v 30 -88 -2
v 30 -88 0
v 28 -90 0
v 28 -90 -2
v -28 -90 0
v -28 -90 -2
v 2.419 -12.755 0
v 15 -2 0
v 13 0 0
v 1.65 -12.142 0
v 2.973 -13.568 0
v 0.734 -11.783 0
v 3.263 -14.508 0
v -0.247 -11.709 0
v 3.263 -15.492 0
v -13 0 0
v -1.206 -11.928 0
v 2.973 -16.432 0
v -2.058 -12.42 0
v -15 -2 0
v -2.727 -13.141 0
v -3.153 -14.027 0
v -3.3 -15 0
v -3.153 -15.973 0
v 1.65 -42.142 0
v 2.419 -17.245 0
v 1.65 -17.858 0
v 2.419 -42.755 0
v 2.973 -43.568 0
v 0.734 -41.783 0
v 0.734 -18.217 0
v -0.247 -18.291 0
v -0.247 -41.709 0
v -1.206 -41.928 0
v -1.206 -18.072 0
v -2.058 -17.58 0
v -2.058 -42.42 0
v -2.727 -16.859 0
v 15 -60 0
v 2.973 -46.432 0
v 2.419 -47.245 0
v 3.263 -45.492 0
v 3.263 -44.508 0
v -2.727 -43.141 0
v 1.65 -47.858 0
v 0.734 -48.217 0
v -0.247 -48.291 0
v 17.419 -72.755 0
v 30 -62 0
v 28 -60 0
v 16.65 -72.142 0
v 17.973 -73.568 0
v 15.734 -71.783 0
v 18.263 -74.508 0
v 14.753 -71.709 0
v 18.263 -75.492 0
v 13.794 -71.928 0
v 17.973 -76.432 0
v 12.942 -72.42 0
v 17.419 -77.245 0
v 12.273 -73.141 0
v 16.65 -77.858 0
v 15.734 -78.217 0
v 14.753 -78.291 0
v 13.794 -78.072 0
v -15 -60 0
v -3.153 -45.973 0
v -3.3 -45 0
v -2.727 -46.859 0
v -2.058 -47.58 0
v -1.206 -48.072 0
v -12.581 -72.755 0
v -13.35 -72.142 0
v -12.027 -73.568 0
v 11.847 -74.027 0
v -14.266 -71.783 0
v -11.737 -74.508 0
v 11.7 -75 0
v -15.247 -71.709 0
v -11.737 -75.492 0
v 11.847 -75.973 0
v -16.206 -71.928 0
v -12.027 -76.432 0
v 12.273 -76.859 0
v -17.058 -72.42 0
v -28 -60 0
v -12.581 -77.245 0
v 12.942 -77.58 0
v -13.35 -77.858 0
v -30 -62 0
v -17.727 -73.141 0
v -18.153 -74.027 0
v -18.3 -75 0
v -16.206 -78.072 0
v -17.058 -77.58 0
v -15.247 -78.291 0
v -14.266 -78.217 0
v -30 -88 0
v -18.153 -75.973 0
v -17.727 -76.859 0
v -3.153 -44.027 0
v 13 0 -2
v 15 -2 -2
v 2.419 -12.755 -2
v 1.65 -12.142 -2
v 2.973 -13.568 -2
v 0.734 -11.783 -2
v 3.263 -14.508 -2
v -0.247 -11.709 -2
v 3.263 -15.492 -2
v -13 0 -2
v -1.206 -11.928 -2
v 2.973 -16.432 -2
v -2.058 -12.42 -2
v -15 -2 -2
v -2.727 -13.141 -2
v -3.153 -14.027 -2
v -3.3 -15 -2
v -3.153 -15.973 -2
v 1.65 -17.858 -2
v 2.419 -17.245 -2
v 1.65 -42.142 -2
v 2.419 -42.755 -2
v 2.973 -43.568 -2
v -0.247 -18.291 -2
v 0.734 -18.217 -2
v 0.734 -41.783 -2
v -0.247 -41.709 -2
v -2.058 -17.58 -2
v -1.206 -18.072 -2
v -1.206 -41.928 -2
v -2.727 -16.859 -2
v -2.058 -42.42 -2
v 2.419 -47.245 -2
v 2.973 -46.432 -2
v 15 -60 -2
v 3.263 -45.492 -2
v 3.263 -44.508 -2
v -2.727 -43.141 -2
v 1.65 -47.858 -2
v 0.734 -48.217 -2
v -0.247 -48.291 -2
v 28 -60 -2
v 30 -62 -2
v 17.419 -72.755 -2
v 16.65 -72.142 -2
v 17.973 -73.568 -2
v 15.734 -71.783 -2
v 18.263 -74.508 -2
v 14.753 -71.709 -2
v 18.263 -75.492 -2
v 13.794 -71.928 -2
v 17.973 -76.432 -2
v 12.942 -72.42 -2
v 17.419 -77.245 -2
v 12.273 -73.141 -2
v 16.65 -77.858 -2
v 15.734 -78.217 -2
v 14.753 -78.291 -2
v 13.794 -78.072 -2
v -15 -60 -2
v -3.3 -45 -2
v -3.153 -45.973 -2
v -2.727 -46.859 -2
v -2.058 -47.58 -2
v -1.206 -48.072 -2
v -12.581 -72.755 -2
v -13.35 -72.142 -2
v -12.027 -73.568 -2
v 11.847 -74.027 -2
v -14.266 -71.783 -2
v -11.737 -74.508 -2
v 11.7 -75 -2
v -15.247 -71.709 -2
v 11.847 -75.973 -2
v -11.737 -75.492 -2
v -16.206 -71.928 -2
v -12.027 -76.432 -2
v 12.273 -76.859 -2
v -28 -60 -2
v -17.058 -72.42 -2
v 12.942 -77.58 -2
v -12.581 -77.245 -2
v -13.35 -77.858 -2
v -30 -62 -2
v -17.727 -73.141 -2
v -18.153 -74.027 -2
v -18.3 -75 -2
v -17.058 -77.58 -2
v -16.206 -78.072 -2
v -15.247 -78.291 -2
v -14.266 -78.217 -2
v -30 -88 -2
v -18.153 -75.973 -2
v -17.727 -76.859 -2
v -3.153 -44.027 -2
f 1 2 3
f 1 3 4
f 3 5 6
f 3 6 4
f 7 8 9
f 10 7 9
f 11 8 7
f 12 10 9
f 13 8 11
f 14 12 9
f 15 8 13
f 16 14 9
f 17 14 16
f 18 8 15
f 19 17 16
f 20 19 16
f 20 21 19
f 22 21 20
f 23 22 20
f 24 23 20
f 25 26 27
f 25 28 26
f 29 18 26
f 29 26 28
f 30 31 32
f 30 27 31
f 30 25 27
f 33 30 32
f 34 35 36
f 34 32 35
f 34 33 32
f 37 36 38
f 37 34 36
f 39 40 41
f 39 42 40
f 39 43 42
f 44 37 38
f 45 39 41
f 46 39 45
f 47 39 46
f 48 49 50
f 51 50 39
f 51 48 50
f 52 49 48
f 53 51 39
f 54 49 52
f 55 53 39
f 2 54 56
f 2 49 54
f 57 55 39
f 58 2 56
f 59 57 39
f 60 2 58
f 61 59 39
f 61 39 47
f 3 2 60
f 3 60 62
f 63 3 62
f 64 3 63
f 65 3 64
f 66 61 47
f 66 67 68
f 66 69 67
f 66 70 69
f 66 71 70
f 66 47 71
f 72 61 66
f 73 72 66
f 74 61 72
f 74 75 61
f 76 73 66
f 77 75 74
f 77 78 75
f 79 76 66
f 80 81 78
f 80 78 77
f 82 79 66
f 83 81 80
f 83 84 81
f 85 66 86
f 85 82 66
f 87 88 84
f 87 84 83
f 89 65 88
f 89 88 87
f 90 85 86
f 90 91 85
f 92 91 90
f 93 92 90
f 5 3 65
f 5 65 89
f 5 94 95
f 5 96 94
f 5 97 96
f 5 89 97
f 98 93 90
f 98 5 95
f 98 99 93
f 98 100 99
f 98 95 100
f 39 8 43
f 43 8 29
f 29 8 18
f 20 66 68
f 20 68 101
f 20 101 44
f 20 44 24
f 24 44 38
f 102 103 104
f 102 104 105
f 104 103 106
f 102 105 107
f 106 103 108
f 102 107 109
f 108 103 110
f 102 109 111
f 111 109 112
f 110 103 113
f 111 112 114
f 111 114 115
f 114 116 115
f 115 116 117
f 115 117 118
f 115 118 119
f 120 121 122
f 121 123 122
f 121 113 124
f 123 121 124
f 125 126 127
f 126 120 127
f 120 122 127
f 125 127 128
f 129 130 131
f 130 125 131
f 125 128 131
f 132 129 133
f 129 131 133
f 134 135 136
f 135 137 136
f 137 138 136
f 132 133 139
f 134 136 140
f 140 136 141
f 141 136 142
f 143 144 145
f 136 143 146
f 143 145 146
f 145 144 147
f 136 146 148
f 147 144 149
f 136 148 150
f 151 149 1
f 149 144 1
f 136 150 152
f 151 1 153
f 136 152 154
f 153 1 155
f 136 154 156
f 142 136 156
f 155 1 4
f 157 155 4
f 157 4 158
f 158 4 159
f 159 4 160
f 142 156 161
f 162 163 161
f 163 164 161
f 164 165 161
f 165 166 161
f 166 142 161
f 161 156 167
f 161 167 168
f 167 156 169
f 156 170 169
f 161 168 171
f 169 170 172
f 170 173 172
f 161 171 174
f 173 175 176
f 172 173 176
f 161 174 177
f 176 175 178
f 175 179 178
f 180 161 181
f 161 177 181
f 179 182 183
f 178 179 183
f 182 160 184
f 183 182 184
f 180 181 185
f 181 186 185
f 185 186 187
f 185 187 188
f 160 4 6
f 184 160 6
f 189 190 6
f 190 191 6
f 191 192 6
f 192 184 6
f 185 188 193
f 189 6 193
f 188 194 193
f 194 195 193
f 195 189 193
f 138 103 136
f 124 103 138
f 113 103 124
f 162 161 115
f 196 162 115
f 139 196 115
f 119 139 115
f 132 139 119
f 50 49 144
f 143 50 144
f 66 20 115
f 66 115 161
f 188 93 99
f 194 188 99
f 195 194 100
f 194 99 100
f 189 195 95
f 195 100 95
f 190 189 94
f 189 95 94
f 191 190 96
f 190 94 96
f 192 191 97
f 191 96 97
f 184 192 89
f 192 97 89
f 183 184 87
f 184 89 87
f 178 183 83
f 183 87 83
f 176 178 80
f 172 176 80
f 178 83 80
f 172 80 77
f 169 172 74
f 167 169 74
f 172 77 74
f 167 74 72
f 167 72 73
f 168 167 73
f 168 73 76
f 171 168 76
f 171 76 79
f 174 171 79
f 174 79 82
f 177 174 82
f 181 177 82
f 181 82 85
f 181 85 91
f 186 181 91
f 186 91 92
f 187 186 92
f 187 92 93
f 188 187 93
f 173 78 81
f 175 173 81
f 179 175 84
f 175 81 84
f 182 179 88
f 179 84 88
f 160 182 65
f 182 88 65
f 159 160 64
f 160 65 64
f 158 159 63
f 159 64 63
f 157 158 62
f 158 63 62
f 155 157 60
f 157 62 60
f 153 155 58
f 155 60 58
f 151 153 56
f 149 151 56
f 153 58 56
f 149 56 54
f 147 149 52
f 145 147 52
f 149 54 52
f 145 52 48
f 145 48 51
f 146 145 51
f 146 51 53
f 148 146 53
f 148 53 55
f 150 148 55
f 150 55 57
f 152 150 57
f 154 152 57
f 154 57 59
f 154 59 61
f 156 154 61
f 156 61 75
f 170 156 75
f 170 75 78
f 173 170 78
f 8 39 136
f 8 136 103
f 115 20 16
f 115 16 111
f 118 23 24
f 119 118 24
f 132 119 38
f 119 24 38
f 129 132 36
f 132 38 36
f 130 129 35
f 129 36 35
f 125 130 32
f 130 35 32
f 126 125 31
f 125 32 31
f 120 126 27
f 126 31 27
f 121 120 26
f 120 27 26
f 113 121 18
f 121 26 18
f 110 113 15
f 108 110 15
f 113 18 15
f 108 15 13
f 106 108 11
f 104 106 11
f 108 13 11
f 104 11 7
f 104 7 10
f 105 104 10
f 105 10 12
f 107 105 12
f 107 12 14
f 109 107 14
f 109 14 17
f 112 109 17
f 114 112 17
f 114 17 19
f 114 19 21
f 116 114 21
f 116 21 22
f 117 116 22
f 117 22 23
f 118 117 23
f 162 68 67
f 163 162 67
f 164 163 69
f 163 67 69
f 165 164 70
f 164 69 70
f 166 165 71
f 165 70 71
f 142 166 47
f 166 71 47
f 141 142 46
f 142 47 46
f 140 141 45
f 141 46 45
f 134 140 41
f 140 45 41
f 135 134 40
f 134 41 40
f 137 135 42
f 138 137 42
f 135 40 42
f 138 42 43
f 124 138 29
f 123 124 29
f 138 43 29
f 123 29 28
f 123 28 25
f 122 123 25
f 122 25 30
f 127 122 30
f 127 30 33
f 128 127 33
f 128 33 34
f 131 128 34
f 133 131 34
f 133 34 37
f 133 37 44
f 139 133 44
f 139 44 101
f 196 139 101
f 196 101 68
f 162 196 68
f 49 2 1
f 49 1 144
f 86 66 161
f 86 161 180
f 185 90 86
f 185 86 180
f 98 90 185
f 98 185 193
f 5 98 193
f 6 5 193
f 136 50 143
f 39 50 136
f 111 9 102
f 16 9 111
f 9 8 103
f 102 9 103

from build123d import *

# Parameters (mm, degrees)
EXTRUDE_1_DEPTH   = 2
HOLE_WIZARD_M61_D = 6.6
CHAMFER_1_SIZE    = 2


with BuildPart() as part:
    # Эскиз1 → Бобышка-Вытянуть1 (new body)
    with BuildSketch(Plane(origin=(0, 0, 0), x_dir=(1, 0, 0), z_dir=(0, 0, -1))):
        Polygon((-30, 90), (30, 90), (30, 60), (15, 60), (15, 0), (-15, 0), (-15, 60), (-30, 60), align=None)
    extrude(amount=EXTRUDE_1_DEPTH)

    # Отверстие с зазором M61 (through all)
    with Locations(Plane(origin=(0, 0, -2), x_dir=(1, 0, 0), z_dir=(0, 0, -1))):
        with Locations((0, 15), (-15, 75), (15, 75), (0, 45)):
            Hole(HOLE_WIZARD_M61_D / 2)

    # Фаска1
    chamfer_1_edges = [part.edges().sort_by_distance(p)[0] for p in [
        (-30, -60, -1),
        (-30, -90, -1),
        (30, -90, -1),
        (30, -60, -1),
        (15, 0, -1),
        (-15, 0, -1),
    ]]
    chamfer(chamfer_1_edges, length=CHAMFER_1_SIZE)


solid = part.part
